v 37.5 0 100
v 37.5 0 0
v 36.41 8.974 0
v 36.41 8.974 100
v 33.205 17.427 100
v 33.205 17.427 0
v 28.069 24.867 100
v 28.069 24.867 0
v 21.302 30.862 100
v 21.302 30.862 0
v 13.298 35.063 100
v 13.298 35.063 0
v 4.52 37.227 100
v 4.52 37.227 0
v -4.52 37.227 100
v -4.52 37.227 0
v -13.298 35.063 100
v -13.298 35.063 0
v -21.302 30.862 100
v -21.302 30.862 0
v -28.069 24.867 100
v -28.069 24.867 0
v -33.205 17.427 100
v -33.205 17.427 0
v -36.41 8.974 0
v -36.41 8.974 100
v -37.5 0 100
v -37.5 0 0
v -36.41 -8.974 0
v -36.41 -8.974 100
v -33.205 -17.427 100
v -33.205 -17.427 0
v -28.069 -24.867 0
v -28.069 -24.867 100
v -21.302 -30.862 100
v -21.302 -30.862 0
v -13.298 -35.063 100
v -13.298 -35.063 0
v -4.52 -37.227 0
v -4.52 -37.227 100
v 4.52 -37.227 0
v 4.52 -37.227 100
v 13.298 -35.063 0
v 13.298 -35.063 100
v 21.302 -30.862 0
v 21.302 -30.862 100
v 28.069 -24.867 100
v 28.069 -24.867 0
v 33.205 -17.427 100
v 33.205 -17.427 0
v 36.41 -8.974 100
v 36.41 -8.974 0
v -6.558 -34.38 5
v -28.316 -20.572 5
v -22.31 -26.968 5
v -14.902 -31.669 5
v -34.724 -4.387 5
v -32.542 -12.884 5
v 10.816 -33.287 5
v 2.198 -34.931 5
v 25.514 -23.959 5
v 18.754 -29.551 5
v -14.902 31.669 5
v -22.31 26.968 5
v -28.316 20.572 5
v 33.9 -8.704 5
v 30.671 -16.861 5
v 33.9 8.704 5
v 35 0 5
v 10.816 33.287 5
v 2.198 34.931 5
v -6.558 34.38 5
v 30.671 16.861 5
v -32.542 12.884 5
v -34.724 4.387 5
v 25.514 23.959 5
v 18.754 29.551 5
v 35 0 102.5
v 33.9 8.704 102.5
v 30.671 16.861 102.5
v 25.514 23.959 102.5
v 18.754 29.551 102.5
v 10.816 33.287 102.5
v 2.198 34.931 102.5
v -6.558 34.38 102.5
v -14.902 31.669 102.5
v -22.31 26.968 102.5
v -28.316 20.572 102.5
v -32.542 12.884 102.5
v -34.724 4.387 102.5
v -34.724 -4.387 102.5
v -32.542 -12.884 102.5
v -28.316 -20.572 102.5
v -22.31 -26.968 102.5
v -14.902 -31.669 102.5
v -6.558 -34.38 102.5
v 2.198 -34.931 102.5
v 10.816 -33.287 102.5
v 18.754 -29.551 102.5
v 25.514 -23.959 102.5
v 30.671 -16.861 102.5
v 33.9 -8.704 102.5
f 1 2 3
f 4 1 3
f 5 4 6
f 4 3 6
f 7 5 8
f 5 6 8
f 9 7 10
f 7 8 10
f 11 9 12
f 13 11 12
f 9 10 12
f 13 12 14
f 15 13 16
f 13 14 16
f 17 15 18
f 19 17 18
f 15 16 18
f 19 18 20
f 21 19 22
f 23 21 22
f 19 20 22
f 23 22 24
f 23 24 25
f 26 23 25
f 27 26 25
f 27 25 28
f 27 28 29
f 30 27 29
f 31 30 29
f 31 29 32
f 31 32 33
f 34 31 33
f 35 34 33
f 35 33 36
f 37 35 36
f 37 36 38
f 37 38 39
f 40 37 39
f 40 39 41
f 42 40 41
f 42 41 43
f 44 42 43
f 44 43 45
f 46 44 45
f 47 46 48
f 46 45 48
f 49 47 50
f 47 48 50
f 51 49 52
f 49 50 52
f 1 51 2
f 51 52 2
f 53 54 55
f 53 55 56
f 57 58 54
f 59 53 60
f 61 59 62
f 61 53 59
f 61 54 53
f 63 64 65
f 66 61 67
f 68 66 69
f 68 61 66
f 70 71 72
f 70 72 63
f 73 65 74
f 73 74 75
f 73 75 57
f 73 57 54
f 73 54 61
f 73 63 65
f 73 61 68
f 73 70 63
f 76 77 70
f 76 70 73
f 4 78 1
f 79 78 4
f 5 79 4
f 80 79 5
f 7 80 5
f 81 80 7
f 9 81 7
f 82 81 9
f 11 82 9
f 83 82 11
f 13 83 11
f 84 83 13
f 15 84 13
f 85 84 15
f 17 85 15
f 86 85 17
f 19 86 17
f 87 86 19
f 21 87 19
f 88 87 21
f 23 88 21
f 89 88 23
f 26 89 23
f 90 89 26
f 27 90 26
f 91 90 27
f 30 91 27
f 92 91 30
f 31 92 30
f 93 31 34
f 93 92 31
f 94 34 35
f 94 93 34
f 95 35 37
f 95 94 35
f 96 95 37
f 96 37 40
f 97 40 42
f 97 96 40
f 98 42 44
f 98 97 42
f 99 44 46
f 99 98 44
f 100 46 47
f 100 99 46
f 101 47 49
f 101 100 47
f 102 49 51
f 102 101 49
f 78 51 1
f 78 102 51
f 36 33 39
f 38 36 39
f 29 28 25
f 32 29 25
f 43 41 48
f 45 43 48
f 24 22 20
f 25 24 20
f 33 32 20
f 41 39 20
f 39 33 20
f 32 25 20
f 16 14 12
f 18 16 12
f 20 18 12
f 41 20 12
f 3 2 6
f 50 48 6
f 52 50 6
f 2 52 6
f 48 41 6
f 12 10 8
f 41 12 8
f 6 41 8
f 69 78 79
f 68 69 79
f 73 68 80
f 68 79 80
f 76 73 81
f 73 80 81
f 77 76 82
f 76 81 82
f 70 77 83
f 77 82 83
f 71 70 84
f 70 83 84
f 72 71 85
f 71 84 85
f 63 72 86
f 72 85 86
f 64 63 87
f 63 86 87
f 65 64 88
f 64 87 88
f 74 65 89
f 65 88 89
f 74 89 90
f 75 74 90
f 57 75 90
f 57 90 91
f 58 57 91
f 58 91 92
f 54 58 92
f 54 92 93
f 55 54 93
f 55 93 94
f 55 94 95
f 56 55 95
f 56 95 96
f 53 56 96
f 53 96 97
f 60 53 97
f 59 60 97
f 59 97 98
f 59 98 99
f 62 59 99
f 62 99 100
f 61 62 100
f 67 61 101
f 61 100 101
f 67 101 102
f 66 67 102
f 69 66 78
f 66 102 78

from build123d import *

# Parameters (mm, degrees)
F0_R     = 37.5
F1_DEPTH = 105
F2_R     = 35
F3_DEPTH = 100


# Not quite as in the source:
# - a fillet or chamfer that OpenCascade refuses, or shapes differently, is made with other operations: its cross-section is extruded or revolved along the edge and cut away or added


with BuildPart() as f1:
    # F0 (on Top) → F1 (new body)
    with BuildSketch(Plane.XY):
        Circle(F0_R)
    extrude(amount=F1_DEPTH)

    # F2 (on face) → F3 (cut)
    with BuildSketch(Plane.XY.offset(105)):
        Circle(F2_R)
    extrude(amount=-F3_DEPTH, mode=Mode.SUBTRACT)

    # F4: chamfer of 5 on 1 edges, made by hand

    # F4_s1 → F4_t2 (revolve, cut)
    with BuildSketch(Plane.XZ):
        Polygon((37.5, 100), (32.5, 105), (37.5, 105), align=None)
    revolve(axis=Axis((0, 0, 105), (0, 0, 1)), mode=Mode.SUBTRACT)


solid = f1.part
